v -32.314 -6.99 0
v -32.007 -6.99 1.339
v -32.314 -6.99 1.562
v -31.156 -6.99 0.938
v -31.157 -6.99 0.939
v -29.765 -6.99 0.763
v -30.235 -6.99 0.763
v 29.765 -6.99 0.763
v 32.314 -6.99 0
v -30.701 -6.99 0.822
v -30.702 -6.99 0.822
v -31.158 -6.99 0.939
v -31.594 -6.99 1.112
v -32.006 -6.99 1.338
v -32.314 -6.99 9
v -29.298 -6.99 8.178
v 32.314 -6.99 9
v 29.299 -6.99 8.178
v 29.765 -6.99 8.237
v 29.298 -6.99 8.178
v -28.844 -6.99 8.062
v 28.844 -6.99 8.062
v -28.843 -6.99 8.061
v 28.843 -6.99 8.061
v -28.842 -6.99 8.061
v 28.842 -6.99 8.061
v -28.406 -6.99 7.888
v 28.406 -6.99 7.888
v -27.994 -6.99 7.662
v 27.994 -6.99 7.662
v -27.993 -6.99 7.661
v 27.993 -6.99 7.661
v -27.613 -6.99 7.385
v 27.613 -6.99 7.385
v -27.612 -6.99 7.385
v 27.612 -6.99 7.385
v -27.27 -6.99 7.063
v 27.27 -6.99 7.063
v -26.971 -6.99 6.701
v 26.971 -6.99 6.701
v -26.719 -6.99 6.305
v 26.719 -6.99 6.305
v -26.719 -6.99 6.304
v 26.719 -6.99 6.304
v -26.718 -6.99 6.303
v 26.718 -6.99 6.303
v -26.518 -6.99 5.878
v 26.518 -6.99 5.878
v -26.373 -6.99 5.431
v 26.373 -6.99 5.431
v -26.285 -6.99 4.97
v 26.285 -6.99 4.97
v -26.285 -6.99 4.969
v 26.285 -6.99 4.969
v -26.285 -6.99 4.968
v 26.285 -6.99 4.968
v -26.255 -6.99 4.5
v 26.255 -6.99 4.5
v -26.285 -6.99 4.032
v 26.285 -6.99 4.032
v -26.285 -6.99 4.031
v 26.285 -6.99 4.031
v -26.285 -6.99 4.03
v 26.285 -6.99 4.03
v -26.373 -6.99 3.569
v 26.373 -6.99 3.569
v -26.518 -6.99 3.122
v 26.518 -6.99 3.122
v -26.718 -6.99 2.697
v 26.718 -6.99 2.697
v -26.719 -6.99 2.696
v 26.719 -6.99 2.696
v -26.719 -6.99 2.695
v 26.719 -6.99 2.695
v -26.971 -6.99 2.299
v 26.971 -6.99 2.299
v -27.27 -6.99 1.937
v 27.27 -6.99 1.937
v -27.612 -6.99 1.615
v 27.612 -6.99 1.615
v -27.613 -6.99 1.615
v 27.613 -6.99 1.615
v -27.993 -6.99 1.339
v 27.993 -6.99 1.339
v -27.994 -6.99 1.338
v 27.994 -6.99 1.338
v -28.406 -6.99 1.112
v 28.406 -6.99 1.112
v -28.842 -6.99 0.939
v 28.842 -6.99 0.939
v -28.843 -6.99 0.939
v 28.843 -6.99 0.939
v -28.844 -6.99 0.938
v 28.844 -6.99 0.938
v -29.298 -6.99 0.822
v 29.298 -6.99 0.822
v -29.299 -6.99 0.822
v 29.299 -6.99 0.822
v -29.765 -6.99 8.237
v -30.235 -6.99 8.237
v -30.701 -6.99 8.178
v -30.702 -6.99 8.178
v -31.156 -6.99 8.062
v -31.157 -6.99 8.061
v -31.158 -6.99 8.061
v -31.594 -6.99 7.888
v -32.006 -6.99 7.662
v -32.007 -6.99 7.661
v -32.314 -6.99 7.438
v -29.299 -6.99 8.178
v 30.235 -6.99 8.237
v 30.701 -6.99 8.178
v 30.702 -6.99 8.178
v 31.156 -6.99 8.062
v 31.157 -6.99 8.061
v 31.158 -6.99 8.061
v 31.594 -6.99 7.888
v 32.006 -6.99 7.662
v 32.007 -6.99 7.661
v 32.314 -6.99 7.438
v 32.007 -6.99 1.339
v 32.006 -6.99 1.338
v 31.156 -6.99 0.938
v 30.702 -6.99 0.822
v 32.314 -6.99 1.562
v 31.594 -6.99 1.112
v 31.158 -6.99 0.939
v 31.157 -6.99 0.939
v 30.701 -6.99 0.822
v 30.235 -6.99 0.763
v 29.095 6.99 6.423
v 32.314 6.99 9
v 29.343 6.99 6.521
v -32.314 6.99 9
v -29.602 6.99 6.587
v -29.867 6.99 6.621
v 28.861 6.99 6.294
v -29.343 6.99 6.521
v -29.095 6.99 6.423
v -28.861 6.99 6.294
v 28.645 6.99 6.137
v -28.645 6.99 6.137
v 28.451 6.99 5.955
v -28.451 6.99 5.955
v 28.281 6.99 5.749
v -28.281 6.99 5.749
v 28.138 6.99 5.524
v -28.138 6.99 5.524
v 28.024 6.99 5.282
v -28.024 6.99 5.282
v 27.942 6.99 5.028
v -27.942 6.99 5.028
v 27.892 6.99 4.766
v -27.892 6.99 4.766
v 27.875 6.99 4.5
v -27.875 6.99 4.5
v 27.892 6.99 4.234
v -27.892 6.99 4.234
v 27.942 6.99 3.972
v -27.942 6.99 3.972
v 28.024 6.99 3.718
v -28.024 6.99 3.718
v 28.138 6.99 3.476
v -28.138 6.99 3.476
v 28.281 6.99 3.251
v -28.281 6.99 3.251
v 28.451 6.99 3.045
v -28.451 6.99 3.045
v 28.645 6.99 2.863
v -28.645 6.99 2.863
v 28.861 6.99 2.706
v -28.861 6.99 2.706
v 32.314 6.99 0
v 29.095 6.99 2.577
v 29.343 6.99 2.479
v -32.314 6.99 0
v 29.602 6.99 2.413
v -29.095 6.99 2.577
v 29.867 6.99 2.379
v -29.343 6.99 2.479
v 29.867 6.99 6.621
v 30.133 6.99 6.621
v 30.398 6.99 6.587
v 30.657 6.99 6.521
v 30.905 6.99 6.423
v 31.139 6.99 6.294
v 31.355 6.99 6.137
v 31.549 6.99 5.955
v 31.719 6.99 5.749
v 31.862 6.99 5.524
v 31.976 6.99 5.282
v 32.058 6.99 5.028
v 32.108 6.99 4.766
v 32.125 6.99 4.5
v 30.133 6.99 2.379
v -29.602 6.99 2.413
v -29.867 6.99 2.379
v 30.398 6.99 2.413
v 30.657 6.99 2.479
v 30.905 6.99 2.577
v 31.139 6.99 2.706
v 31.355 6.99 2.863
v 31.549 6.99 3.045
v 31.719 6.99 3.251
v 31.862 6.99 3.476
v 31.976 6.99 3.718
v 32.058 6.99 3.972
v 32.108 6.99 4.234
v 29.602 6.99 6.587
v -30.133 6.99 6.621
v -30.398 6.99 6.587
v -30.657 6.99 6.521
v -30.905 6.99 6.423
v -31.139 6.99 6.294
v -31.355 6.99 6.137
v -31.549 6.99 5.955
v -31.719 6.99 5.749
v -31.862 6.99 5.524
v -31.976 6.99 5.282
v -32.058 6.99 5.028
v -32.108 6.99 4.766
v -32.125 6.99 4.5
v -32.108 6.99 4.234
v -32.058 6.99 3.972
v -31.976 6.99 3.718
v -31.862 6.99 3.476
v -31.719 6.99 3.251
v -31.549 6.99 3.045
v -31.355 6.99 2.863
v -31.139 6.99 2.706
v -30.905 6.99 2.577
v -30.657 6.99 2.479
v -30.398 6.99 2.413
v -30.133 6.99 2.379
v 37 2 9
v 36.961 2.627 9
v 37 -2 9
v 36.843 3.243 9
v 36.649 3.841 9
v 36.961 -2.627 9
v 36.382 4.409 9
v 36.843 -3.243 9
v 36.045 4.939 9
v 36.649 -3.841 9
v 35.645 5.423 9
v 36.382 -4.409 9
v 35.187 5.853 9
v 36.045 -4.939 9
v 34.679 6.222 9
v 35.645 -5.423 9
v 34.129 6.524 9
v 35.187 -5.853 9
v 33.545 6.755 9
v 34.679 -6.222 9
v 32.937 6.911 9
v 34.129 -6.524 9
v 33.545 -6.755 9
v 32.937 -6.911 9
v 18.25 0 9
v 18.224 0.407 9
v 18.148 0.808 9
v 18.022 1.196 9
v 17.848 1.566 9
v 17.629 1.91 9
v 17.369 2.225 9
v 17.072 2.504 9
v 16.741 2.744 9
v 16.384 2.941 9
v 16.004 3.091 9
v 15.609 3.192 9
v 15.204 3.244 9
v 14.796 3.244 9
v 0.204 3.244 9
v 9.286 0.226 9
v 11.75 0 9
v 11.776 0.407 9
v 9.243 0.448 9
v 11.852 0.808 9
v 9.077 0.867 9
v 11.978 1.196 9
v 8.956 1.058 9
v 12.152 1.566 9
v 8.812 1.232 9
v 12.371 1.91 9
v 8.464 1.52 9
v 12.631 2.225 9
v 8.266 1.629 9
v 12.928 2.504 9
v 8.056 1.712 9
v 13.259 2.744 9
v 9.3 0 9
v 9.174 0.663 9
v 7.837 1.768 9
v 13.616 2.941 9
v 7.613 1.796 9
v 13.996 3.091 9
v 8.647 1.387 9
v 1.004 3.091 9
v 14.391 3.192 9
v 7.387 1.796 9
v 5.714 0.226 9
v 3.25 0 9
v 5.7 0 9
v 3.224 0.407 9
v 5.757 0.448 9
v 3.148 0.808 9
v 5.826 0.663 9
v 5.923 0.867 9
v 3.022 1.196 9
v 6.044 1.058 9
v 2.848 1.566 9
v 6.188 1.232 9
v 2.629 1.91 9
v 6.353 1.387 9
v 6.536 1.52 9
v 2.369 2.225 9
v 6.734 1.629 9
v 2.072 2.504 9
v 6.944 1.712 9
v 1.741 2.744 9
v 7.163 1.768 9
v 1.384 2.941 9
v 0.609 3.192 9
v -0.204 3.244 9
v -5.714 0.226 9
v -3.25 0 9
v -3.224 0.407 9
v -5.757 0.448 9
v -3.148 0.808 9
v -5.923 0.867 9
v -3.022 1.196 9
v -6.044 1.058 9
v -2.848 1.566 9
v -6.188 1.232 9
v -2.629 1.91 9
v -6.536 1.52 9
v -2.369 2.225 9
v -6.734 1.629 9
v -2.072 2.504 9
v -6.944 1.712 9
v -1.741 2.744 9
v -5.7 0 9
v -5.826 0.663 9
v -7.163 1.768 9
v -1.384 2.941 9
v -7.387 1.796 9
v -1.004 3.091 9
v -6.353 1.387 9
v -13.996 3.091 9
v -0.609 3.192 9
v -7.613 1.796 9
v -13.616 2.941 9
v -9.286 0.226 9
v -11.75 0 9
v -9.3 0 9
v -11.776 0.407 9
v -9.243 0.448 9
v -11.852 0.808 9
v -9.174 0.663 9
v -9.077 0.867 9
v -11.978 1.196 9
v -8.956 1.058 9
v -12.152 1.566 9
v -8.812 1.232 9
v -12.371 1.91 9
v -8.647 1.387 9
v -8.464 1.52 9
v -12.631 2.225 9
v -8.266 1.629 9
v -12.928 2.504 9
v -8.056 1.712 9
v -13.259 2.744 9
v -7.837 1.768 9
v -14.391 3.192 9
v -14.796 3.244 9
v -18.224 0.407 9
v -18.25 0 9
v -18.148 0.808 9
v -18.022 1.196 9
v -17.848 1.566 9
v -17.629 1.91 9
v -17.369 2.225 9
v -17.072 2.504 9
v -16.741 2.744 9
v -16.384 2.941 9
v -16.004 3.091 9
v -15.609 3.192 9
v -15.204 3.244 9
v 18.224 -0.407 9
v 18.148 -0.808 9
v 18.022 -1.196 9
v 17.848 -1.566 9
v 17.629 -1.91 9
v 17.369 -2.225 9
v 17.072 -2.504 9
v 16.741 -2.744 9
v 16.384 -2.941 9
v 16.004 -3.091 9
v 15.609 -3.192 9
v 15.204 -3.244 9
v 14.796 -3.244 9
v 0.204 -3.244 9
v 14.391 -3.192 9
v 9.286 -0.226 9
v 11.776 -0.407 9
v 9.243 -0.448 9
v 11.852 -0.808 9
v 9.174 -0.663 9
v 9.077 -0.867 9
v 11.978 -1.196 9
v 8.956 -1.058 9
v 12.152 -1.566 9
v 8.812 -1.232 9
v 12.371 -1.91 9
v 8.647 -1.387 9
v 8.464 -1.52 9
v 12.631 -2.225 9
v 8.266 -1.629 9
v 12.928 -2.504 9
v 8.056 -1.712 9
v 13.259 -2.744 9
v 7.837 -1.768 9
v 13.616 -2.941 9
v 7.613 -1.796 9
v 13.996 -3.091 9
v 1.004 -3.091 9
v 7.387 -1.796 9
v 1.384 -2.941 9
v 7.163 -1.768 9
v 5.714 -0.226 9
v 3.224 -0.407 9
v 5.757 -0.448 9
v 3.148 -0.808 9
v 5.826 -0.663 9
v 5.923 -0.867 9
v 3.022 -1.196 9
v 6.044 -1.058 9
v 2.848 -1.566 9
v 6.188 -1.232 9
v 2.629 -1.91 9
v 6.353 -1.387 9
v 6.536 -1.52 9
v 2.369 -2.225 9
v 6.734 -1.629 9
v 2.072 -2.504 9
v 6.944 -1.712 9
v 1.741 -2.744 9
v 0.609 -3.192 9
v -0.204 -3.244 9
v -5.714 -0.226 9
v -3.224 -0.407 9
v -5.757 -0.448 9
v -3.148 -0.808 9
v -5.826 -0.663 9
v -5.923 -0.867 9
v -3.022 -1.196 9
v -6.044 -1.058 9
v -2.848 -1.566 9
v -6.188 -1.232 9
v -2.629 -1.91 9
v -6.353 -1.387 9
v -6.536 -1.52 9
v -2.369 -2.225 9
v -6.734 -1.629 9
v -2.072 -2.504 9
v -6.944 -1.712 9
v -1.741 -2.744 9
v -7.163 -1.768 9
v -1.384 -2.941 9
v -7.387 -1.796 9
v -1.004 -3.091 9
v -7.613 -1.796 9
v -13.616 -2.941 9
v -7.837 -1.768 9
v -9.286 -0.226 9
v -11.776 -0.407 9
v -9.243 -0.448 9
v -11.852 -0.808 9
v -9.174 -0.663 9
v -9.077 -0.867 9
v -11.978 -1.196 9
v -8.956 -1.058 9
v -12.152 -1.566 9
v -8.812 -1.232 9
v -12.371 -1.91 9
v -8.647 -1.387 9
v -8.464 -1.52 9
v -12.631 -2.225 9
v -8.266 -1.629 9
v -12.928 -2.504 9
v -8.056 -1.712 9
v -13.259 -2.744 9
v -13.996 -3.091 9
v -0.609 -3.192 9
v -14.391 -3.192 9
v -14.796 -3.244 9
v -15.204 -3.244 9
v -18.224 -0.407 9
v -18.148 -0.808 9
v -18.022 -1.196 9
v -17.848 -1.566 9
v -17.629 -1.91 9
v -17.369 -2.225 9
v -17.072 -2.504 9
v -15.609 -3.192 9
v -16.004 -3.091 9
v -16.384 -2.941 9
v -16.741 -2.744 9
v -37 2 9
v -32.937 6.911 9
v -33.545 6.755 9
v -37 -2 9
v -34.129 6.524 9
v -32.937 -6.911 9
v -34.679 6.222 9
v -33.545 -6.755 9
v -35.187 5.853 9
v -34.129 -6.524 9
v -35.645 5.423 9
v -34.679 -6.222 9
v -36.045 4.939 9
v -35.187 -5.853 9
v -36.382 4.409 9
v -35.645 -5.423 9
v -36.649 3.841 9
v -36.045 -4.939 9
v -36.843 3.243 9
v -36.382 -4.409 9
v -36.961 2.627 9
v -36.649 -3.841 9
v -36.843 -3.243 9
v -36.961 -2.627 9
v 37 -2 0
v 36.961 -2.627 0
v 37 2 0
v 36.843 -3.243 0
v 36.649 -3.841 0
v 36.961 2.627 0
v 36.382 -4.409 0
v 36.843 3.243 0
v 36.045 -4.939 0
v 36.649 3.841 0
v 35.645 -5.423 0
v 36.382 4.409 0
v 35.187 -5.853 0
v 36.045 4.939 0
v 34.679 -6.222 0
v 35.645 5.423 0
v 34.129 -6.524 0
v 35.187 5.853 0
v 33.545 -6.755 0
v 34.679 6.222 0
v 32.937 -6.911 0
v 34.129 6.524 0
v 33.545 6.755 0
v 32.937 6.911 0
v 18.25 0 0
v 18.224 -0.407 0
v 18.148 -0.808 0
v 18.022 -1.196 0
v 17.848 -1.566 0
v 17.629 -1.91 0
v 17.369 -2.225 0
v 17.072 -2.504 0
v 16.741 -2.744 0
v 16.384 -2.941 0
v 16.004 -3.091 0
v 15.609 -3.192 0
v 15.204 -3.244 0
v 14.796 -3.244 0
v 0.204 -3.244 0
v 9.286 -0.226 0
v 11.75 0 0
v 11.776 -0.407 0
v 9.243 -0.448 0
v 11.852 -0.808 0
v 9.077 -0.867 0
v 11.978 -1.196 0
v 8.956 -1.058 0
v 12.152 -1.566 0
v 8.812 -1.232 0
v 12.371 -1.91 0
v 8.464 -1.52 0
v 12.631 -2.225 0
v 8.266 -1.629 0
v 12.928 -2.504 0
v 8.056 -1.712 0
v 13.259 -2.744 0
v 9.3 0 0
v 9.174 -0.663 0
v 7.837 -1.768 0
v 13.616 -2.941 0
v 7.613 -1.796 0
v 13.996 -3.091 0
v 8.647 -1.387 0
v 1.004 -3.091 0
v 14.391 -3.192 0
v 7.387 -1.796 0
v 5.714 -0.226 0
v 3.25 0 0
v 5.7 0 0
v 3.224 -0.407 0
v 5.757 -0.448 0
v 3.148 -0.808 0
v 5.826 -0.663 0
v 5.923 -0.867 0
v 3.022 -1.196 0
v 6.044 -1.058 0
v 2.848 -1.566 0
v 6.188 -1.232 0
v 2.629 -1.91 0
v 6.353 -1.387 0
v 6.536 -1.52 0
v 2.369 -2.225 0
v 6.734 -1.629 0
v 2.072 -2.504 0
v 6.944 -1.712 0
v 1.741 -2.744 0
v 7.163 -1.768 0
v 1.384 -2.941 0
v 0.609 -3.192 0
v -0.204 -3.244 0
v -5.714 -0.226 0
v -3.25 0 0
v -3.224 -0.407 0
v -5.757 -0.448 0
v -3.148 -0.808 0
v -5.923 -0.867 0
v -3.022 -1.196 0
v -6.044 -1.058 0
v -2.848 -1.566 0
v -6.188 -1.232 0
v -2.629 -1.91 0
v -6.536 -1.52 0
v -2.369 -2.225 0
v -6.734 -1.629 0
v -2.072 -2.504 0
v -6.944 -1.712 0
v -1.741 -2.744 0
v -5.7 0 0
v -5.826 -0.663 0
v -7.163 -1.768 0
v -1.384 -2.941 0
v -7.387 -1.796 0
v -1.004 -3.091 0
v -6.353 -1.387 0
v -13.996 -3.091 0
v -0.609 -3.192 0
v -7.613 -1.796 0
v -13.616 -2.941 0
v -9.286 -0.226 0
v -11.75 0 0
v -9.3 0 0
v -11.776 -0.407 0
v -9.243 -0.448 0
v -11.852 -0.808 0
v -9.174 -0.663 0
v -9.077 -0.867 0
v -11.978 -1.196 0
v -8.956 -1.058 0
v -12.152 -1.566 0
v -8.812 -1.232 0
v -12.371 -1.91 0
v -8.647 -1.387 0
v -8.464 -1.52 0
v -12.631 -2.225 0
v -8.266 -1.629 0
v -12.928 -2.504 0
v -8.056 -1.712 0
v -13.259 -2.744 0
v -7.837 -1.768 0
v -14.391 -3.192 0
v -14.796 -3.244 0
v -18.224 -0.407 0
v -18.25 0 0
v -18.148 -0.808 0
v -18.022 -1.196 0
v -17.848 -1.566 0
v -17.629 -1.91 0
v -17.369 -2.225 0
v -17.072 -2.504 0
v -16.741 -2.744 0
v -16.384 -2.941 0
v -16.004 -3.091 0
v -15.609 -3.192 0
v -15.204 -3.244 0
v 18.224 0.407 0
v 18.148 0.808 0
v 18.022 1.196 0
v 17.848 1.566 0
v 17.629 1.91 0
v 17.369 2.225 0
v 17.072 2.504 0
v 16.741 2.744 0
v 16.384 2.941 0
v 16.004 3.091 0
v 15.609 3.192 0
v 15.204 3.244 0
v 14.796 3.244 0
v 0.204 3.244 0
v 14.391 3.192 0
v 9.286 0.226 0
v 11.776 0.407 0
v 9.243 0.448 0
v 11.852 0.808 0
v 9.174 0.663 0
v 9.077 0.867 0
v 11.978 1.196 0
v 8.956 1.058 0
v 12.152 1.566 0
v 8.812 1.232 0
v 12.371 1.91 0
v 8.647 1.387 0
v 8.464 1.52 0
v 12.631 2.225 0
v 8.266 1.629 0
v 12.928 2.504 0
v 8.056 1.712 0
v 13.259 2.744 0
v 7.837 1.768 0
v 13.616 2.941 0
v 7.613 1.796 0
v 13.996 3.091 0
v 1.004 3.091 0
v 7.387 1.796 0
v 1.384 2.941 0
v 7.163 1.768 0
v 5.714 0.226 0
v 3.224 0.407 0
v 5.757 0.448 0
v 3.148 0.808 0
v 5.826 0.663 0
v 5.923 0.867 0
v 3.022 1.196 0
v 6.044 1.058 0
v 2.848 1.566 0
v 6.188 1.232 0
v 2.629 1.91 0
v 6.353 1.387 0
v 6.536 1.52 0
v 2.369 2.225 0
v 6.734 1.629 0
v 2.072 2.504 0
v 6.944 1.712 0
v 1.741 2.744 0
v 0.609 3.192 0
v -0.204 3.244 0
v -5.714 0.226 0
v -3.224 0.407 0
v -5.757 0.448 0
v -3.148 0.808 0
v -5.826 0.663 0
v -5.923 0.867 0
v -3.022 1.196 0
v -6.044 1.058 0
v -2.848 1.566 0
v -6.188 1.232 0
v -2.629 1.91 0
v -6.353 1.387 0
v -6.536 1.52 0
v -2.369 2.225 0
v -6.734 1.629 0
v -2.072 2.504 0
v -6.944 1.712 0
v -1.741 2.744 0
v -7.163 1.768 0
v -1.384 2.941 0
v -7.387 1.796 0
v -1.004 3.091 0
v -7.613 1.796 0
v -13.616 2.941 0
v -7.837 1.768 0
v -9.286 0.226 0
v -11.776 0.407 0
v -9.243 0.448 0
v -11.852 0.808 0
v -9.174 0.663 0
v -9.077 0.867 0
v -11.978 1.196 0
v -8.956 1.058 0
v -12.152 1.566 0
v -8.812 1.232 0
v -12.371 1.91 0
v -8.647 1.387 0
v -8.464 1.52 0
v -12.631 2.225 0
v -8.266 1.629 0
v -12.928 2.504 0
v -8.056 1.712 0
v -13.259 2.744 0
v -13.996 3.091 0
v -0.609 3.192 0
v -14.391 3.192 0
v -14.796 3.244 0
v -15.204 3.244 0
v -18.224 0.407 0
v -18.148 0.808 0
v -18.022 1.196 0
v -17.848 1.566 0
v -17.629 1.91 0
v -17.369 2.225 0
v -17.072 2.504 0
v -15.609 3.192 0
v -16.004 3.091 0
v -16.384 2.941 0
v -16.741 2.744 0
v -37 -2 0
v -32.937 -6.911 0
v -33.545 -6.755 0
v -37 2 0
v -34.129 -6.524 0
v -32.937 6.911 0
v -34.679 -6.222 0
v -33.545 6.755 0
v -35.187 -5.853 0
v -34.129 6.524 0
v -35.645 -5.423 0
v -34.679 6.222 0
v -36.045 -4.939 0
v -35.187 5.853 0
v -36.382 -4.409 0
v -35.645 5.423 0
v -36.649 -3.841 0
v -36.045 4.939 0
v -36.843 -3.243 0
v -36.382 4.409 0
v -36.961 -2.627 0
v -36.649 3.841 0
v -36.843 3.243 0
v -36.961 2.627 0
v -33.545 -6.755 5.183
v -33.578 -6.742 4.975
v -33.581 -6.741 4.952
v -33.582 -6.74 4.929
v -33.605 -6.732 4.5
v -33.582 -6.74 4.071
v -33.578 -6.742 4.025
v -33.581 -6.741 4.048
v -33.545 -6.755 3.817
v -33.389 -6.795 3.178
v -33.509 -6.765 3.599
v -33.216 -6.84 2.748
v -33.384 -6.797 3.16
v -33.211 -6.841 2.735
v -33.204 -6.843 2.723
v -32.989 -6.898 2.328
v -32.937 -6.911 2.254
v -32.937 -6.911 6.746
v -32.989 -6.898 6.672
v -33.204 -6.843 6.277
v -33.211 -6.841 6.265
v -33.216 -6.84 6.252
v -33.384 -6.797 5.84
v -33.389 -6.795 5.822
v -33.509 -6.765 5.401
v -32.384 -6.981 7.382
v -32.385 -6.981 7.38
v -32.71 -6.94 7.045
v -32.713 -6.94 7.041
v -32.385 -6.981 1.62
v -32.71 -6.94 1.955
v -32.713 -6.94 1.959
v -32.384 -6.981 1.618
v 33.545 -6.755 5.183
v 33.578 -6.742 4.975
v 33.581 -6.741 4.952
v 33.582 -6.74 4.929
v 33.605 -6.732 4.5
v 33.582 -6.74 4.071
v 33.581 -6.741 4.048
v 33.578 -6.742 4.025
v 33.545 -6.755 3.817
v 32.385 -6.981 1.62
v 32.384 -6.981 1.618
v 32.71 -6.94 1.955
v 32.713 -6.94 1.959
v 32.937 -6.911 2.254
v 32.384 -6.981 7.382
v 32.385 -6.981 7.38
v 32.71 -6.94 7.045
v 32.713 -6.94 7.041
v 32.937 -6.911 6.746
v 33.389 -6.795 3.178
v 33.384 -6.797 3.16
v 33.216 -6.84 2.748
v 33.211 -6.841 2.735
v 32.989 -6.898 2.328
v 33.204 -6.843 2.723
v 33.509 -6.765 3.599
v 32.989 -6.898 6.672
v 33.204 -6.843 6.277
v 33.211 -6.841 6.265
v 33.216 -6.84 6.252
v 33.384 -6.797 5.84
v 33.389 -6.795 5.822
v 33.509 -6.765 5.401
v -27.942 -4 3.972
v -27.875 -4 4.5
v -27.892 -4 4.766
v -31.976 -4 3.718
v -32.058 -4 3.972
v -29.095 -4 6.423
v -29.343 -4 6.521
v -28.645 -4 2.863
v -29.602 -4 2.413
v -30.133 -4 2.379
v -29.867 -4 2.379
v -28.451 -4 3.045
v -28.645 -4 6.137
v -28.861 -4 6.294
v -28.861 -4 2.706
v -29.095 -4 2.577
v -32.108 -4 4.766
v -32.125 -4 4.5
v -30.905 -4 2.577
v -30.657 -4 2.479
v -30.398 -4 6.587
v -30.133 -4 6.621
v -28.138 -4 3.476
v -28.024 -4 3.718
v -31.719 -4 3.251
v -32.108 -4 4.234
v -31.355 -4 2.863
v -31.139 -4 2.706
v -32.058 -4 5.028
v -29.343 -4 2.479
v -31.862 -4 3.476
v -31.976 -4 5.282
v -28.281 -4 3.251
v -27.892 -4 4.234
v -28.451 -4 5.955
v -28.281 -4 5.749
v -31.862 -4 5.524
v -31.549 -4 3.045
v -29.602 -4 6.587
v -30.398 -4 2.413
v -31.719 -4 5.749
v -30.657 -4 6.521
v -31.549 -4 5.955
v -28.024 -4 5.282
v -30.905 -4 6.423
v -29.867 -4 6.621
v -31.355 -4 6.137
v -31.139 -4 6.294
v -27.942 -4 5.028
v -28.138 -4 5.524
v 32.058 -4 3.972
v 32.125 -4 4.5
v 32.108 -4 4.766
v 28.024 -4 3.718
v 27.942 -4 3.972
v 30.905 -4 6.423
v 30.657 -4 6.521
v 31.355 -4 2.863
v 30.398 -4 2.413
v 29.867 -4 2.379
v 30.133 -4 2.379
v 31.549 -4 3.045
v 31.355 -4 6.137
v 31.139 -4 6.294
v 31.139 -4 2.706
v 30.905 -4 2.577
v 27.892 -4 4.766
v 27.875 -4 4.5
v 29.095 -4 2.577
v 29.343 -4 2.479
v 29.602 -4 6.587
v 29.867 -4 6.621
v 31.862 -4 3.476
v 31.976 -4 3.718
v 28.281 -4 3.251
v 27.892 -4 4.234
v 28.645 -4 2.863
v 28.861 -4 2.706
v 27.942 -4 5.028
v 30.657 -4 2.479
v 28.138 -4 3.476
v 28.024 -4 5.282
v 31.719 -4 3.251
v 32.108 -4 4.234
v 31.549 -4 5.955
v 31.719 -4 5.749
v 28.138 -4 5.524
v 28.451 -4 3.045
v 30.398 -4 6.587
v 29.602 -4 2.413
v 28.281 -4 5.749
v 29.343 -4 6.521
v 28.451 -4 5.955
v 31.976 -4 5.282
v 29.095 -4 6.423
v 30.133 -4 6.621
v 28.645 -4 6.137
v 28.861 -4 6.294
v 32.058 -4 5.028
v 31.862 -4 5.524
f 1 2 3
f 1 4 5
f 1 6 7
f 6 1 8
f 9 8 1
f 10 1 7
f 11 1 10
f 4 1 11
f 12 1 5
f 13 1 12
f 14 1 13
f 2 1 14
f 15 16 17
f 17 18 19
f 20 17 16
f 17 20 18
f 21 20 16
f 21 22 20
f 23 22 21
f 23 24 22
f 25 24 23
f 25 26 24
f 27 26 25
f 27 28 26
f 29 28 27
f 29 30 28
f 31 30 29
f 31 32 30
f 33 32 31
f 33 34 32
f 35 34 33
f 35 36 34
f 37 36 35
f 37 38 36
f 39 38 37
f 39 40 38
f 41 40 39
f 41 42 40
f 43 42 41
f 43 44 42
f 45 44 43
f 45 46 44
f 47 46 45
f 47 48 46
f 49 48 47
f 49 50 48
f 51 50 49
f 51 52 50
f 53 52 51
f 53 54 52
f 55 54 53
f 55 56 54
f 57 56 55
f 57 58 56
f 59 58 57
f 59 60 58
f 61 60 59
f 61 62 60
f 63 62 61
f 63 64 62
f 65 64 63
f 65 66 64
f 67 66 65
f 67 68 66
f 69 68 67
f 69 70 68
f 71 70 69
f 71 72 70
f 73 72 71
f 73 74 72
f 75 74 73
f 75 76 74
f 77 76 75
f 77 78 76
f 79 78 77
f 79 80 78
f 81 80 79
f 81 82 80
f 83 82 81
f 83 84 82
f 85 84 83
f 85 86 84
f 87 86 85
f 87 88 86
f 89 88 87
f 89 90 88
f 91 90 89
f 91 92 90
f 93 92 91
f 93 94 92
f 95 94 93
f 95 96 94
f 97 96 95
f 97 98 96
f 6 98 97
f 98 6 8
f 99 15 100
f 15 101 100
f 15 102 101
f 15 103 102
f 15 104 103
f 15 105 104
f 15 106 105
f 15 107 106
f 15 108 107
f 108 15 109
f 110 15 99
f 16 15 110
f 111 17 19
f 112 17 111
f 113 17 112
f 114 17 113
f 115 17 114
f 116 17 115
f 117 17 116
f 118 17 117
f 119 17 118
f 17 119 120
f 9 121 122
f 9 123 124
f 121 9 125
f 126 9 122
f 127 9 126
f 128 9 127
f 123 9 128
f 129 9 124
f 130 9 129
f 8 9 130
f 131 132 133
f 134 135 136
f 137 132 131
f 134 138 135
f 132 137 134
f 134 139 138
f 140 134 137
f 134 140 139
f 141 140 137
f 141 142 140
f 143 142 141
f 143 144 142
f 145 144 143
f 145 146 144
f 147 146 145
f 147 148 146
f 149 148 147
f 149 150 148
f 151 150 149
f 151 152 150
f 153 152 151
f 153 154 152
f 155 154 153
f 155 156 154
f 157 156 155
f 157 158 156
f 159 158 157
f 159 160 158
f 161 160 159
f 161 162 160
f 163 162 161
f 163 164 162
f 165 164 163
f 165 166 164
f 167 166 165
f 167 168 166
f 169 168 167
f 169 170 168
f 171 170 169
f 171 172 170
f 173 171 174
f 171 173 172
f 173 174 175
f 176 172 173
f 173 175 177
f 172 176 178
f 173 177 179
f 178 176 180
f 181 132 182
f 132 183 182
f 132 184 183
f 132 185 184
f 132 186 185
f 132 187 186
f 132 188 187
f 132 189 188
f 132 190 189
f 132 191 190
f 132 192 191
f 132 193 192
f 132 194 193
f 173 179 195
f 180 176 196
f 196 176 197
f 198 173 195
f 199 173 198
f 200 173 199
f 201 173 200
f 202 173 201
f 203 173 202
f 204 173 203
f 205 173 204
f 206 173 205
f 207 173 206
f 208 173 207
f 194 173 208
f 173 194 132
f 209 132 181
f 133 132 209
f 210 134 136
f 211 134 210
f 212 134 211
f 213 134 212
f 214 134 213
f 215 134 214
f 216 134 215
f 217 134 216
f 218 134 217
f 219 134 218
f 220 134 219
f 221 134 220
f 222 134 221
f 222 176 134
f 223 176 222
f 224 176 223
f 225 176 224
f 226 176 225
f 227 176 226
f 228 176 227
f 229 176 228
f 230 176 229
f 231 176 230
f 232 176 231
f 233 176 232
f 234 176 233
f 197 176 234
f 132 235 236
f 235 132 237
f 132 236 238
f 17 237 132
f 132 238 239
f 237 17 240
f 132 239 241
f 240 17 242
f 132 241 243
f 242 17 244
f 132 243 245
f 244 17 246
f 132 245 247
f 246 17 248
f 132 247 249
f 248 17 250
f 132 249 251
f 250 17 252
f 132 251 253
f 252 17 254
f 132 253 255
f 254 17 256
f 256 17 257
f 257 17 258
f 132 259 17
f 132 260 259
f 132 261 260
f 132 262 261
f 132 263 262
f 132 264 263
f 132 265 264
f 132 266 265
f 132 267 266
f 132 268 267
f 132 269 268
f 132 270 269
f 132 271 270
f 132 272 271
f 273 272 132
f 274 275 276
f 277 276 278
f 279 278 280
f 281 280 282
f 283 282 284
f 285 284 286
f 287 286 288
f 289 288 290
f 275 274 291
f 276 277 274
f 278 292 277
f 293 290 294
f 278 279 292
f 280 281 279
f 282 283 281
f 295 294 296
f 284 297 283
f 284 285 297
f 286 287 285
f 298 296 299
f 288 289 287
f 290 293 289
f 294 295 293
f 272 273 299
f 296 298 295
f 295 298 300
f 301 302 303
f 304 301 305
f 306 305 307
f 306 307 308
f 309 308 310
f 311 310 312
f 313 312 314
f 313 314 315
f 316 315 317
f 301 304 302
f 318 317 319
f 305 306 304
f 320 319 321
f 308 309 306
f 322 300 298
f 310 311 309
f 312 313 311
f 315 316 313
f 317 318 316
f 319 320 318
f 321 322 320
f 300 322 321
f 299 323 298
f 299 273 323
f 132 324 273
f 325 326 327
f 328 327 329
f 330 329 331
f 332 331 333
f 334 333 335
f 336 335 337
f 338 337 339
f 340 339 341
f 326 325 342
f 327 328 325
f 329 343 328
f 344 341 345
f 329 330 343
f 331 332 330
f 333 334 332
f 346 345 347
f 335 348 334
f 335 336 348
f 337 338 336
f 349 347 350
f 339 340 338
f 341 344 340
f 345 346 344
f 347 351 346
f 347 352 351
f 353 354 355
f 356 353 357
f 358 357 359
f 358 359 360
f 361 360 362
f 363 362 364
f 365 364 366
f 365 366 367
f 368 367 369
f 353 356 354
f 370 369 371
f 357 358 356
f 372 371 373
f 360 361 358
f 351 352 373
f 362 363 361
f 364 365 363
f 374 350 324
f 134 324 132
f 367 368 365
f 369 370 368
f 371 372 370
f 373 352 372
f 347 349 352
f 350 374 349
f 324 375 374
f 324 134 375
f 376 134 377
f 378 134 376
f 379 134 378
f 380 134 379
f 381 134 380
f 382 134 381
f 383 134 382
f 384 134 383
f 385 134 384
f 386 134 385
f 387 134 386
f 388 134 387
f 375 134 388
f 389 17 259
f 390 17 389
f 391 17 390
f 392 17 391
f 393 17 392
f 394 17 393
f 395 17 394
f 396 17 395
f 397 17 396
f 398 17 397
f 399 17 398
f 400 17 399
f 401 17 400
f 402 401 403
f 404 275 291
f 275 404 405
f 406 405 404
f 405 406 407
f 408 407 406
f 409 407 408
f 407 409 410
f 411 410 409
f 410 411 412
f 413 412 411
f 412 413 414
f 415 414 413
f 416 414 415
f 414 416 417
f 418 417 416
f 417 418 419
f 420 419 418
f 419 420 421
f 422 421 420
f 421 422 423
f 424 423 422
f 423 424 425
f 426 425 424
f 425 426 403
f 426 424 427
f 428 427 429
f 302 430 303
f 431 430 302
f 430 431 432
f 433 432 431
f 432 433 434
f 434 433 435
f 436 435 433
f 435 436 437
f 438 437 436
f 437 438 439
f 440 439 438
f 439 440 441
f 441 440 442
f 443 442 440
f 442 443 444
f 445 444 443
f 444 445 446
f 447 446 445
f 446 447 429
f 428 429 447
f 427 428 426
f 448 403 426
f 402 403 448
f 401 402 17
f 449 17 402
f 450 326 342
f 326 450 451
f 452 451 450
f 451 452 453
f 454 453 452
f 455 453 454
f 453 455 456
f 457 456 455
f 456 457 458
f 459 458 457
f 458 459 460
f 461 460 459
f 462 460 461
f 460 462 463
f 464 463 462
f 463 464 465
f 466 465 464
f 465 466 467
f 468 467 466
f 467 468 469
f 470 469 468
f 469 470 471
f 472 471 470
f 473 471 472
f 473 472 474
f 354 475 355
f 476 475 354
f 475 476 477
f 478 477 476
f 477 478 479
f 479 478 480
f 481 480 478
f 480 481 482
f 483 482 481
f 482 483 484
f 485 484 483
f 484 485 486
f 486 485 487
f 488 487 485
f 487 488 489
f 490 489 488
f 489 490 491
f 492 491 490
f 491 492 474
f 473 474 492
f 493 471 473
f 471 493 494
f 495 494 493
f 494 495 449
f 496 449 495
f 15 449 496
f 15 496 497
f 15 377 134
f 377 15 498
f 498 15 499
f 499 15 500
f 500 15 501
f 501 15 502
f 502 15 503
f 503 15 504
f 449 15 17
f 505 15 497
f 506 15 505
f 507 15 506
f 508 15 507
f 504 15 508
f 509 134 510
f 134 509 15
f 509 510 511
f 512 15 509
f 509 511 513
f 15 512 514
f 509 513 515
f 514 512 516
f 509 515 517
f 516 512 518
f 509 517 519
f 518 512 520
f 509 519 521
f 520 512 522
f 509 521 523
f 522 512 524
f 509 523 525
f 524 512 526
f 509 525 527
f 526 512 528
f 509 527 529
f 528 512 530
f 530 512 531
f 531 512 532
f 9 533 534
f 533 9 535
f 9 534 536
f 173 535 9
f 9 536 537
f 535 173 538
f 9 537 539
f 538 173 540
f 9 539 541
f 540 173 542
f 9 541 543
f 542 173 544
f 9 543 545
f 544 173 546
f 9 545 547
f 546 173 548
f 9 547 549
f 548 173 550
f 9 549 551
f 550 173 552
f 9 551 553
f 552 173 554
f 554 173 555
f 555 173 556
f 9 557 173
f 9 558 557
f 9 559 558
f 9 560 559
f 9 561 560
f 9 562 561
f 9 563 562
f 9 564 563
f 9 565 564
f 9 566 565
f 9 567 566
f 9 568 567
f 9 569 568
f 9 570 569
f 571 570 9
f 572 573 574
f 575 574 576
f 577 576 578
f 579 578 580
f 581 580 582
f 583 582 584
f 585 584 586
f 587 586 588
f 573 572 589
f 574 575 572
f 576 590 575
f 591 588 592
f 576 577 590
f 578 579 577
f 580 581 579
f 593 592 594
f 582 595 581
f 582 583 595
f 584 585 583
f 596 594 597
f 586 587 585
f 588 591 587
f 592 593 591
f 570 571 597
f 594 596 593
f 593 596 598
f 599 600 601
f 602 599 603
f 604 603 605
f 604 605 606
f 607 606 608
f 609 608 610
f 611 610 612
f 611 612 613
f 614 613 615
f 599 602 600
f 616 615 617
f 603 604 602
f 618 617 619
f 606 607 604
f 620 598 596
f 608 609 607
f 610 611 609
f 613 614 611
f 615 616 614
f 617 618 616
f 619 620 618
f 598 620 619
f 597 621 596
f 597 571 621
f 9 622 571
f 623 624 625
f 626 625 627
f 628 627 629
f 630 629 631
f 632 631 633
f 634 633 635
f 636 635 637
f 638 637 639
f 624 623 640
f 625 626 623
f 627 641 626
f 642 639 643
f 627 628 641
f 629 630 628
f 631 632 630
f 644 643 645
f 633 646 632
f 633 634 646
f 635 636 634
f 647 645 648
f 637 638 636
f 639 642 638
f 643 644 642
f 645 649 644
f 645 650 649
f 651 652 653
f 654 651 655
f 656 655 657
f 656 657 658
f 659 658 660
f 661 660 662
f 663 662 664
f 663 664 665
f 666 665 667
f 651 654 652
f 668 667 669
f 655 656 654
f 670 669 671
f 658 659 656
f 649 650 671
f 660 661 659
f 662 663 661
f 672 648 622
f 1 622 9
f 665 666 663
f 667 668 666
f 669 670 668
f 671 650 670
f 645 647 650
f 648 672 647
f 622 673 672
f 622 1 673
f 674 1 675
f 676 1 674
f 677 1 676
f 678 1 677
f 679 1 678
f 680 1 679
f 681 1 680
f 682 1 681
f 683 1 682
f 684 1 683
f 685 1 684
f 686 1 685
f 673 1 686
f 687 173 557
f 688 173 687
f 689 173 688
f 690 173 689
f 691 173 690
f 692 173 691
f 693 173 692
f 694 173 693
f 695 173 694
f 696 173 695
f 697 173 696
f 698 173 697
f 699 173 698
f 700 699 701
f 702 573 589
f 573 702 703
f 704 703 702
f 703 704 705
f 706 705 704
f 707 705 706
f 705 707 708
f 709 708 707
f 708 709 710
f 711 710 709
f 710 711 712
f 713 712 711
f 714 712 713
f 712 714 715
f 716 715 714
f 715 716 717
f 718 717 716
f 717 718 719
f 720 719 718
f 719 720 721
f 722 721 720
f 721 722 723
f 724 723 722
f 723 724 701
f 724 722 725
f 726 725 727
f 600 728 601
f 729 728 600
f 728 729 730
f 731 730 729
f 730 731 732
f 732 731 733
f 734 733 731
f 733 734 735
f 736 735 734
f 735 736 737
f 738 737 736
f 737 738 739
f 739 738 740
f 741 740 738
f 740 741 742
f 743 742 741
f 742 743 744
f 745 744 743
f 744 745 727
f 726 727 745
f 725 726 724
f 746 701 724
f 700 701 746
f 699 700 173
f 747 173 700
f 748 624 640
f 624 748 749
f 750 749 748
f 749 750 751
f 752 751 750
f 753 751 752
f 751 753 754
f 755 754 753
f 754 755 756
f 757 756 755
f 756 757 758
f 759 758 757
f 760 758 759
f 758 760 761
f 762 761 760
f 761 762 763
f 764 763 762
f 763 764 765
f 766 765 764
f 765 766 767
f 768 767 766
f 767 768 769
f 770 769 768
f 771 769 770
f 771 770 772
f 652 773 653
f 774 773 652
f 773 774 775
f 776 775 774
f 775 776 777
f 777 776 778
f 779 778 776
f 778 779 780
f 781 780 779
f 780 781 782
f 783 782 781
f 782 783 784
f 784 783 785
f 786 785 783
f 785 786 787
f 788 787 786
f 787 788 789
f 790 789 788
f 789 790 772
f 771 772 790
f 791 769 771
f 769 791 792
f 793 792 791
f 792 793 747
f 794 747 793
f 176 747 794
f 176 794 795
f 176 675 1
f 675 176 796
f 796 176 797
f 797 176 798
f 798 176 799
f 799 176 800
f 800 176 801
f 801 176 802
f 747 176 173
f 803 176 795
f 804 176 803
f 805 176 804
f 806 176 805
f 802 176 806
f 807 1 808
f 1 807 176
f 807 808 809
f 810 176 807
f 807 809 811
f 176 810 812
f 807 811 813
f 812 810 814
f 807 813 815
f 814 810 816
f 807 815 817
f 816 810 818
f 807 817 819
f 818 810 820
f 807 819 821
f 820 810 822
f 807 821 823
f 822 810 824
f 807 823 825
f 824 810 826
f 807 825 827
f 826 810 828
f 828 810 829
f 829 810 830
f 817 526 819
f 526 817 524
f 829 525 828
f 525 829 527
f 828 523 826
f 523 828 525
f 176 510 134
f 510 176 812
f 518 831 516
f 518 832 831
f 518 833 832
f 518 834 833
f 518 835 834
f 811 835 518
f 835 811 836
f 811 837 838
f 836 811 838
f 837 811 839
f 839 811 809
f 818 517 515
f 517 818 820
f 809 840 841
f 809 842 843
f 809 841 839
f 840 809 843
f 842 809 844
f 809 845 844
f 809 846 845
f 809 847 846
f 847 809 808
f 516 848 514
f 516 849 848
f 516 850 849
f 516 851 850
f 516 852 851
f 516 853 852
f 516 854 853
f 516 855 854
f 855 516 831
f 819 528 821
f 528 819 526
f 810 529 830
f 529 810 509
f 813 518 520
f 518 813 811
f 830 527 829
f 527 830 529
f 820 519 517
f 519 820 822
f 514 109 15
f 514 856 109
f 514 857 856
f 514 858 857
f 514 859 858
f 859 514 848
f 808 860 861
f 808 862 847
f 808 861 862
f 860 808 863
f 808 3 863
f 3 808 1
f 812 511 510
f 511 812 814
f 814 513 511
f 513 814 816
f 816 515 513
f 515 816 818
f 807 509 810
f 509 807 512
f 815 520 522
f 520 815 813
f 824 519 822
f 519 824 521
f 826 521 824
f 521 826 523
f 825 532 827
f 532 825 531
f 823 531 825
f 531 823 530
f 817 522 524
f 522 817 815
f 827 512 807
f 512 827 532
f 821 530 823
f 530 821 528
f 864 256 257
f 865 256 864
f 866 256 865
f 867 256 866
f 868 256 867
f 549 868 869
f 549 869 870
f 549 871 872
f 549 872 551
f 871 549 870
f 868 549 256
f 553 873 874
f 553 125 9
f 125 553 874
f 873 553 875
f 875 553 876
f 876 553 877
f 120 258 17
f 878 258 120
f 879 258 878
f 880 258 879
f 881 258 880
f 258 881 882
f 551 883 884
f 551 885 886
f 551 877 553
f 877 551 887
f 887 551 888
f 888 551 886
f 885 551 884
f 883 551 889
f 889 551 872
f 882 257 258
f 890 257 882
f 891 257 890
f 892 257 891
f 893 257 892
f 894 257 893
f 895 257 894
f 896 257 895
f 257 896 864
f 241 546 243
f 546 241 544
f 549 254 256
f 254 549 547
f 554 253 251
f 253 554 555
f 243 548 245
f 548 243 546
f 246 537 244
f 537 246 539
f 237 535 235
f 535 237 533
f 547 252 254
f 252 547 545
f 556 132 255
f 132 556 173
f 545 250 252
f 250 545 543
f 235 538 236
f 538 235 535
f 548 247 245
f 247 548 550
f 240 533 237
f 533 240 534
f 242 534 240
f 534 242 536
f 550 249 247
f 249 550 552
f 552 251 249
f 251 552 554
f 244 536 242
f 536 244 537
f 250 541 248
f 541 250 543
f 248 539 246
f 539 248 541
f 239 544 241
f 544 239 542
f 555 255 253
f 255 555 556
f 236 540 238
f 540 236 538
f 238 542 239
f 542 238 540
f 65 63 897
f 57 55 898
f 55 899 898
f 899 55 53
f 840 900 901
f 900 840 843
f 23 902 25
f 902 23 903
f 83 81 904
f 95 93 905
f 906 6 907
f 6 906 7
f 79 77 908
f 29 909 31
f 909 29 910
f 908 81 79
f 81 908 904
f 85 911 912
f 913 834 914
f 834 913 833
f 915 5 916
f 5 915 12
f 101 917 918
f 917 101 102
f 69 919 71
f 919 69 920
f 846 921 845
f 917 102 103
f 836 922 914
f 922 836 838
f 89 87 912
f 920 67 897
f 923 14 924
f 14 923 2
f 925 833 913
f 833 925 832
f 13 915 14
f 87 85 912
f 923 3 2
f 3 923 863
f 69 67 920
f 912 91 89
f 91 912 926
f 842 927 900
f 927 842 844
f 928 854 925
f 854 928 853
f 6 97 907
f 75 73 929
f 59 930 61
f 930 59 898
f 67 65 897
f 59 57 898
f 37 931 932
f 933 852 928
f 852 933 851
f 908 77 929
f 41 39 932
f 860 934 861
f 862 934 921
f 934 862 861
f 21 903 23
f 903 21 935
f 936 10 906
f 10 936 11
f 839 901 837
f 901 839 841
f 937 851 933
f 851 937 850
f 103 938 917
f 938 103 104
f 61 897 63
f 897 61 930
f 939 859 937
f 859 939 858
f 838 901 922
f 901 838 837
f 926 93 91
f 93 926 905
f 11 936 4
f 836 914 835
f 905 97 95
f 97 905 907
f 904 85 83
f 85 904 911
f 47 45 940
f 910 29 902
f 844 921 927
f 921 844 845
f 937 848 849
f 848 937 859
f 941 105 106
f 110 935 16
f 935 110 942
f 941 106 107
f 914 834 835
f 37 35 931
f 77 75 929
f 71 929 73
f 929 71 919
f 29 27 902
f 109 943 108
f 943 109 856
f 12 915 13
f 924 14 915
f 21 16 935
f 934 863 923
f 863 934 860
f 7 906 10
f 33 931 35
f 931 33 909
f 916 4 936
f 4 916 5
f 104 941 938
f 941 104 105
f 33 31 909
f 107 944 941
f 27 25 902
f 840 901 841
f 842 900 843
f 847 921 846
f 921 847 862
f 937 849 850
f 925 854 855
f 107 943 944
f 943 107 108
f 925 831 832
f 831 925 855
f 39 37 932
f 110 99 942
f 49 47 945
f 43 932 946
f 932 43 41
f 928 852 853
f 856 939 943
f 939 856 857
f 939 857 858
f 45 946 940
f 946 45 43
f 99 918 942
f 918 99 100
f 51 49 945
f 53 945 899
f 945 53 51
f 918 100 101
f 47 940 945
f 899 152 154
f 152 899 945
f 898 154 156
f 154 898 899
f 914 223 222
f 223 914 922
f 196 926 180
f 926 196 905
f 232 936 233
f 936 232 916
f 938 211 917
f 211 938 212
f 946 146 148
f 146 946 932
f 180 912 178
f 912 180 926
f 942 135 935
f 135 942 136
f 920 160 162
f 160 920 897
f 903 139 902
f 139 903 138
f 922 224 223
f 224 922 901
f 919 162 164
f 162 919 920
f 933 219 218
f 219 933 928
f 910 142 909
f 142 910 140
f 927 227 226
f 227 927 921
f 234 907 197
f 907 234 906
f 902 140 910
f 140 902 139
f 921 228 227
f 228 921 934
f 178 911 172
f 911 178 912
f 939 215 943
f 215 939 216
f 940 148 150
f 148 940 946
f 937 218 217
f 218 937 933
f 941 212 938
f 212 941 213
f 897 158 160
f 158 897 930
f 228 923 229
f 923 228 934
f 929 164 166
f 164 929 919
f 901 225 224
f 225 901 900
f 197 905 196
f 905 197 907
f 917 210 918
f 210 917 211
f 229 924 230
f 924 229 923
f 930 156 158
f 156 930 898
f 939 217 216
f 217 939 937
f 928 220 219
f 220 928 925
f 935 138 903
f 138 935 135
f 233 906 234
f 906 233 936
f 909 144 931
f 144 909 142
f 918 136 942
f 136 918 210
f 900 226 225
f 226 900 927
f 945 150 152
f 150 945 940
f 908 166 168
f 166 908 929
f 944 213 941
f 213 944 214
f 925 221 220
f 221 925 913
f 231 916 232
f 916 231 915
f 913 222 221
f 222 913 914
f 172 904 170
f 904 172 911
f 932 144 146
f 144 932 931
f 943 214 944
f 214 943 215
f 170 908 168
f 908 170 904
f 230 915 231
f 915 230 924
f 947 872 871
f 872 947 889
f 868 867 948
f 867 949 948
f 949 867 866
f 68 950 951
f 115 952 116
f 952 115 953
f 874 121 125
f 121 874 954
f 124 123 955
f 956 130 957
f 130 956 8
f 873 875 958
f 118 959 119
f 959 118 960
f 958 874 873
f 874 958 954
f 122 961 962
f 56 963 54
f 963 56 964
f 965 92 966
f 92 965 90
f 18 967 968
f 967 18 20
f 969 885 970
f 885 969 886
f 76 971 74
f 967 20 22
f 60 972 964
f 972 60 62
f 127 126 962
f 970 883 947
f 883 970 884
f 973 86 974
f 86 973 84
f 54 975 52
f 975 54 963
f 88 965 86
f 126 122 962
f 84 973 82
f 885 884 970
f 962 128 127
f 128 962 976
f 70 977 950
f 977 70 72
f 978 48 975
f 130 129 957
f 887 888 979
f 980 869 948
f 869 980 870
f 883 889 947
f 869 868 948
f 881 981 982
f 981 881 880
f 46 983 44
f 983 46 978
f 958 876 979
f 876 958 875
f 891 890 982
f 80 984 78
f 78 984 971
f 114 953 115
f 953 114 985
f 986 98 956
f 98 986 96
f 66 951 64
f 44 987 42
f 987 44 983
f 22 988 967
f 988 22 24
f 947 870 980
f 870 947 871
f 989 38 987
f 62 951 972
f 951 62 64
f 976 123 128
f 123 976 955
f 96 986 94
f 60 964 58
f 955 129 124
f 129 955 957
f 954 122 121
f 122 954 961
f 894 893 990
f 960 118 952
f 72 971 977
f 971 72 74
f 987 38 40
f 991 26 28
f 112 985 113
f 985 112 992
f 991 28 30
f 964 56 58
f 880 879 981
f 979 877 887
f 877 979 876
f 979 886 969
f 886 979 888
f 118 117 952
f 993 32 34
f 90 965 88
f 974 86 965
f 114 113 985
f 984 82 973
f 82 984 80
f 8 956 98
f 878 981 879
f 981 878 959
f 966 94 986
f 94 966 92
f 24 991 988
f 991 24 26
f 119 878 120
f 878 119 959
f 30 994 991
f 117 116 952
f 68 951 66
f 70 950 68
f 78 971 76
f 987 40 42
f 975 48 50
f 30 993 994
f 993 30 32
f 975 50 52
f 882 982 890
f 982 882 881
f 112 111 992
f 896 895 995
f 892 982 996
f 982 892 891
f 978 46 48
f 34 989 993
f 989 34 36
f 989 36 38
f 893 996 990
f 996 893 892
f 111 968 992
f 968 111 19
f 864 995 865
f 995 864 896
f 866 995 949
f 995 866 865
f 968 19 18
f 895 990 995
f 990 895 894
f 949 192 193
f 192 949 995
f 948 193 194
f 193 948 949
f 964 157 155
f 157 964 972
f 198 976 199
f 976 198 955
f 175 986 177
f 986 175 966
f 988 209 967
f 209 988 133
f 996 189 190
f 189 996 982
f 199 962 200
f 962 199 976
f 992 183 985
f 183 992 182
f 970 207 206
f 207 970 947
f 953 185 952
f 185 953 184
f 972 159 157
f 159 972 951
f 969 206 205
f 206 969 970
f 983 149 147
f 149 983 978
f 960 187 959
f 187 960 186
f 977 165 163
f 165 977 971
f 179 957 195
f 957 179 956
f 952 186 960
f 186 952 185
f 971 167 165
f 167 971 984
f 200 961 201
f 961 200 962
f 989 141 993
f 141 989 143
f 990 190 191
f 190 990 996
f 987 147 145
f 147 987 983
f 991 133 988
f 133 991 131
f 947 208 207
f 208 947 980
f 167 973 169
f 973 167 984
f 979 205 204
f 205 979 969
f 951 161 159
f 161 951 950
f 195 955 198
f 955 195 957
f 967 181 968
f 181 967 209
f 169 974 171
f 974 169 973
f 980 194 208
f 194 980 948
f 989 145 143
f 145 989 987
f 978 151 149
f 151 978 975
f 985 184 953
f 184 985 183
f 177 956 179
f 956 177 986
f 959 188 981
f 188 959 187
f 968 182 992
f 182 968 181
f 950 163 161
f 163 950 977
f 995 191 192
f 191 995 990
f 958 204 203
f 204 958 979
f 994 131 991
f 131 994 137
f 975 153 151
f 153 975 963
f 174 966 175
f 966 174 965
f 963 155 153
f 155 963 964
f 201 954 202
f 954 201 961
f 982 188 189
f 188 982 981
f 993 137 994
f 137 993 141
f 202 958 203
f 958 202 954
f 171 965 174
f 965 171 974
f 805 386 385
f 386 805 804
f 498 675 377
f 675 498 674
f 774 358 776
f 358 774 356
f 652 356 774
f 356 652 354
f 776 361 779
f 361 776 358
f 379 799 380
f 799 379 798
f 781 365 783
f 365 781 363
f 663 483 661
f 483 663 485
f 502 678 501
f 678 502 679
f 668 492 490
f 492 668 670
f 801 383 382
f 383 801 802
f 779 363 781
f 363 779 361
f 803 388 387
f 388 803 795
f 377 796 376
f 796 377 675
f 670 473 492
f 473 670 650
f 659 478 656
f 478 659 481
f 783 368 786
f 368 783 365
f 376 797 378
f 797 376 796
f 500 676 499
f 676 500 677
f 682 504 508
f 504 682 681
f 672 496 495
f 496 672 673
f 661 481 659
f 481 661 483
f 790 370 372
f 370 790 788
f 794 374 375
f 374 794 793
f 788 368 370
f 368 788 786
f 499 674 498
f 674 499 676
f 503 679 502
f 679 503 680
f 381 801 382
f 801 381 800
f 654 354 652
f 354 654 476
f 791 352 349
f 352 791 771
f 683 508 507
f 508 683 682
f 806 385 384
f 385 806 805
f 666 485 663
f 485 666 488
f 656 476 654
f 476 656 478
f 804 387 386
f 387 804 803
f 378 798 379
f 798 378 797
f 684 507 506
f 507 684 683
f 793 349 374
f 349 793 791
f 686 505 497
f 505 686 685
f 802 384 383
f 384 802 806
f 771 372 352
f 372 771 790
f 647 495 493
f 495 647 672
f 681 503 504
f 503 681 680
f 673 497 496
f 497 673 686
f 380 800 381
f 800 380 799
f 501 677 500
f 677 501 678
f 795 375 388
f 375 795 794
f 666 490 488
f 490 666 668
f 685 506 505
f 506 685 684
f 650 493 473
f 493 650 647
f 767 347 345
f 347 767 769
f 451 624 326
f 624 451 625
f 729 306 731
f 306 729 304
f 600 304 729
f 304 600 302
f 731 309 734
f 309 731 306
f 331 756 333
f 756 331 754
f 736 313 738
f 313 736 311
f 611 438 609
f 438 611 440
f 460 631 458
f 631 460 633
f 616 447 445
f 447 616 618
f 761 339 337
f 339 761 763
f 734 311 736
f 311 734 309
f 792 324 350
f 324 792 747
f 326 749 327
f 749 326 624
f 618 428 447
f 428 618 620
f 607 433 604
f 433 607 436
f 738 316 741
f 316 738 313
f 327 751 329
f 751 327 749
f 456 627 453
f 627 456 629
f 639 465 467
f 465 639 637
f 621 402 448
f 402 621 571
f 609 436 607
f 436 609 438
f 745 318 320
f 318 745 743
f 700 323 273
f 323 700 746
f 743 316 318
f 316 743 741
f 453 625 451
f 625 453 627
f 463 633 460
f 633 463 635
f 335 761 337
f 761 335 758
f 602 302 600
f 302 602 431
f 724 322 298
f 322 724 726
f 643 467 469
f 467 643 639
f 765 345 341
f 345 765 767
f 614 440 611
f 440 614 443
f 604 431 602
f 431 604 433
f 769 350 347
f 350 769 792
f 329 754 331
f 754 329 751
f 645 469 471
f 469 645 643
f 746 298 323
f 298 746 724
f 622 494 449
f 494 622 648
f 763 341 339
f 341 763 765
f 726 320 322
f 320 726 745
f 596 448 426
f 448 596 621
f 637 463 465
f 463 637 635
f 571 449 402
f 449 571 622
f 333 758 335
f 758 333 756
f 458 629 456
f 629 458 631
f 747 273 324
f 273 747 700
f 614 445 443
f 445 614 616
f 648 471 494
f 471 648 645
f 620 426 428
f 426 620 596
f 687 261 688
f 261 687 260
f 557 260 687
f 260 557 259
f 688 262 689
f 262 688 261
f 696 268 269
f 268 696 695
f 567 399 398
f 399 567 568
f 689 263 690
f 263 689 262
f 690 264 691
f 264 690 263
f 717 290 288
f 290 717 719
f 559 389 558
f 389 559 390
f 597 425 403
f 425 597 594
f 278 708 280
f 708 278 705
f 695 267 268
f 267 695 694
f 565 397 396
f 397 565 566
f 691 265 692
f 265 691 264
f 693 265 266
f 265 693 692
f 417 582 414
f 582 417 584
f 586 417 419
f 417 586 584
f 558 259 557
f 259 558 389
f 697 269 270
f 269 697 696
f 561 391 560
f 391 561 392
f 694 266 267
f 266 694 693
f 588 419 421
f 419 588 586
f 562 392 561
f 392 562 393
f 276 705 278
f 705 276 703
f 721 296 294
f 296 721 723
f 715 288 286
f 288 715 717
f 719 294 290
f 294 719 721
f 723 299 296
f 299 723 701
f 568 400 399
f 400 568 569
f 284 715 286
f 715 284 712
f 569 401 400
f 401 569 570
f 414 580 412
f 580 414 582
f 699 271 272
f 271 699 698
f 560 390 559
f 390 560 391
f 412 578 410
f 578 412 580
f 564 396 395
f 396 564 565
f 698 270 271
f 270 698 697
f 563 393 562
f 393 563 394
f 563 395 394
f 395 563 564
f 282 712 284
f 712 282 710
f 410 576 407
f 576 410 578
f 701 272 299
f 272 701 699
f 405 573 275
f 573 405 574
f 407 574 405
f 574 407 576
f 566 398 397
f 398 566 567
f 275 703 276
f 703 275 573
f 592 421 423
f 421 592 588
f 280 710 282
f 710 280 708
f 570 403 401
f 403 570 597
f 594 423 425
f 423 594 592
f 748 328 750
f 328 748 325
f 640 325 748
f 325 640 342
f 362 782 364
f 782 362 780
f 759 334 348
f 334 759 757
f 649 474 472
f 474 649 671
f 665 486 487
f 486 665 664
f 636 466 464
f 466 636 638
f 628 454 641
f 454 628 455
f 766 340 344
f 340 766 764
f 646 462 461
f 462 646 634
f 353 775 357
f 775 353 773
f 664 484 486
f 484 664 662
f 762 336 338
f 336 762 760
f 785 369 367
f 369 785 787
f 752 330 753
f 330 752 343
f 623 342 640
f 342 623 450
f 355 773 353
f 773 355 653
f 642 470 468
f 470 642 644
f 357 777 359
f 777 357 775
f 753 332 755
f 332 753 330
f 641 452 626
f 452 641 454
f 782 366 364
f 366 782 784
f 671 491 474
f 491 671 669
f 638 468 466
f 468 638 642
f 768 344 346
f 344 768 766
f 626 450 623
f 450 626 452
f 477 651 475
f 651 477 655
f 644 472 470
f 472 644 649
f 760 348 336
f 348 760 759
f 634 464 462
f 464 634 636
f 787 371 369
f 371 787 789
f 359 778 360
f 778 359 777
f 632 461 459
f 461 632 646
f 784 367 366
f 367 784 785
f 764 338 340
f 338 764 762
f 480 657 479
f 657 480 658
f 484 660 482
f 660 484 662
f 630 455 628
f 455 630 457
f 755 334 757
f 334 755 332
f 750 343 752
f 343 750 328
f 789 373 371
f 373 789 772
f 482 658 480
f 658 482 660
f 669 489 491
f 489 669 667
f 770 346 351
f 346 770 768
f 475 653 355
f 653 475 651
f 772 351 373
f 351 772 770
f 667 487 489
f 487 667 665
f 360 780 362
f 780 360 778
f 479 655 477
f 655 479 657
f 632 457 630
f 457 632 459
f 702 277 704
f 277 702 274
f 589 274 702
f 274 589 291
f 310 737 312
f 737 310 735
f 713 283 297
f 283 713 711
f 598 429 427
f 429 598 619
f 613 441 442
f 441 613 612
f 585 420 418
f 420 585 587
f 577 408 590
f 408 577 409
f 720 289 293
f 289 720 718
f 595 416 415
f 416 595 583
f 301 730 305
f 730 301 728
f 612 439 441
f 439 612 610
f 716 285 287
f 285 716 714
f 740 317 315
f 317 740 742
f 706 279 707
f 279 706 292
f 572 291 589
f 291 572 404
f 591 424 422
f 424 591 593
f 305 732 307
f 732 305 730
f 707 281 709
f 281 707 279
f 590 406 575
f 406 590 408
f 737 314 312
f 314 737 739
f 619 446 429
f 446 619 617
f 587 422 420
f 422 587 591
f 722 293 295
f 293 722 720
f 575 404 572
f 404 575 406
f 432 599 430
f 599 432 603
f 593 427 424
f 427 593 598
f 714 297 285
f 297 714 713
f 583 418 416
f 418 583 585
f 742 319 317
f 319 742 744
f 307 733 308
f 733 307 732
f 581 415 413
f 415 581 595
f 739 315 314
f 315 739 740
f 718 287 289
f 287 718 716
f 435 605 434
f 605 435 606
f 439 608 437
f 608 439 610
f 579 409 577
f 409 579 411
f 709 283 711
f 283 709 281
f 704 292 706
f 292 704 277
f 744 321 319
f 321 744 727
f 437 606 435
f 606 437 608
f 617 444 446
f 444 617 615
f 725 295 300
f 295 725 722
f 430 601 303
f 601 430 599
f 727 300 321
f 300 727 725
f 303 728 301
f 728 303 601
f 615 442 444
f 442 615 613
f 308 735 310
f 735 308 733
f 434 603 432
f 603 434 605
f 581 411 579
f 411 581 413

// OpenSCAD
$fn = 50;


difference() {
	union() {
		hull() {
			translate(v = [-17.0000000000, 2.0000000000, 0]) {
				cylinder(h = 9, r = 5);
			}
			translate(v = [17.0000000000, 2.0000000000, 0]) {
				cylinder(h = 9, r = 5);
			}
			translate(v = [-17.0000000000, -2.0000000000, 0]) {
				cylinder(h = 9, r = 5);
			}
			translate(v = [17.0000000000, -2.0000000000, 0]) {
				cylinder(h = 9, r = 5);
			}
		}
		translate(v = [-22.5000000000, 0.0000000000, 0]) {
			hull() {
				translate(v = [-9.5000000000, 2.0000000000, 0]) {
					cylinder(h = 9, r = 5);
				}
				translate(v = [9.5000000000, 2.0000000000, 0]) {
					cylinder(h = 9, r = 5);
				}
				translate(v = [-9.5000000000, -2.0000000000, 0]) {
					cylinder(h = 9, r = 5);
				}
				translate(v = [9.5000000000, -2.0000000000, 0]) {
					cylinder(h = 9, r = 5);
				}
			}
		}
		translate(v = [-22.5000000000, 0.0000000000, 0]) {
			hull() {
				translate(v = [-9.5000000000, 2.0000000000, 0]) {
					cylinder(h = 9, r = 5);
				}
				translate(v = [9.5000000000, 2.0000000000, 0]) {
					cylinder(h = 9, r = 5);
				}
				translate(v = [-9.5000000000, -2.0000000000, 0]) {
					cylinder(h = 9, r = 5);
				}
				translate(v = [9.5000000000, -2.0000000000, 0]) {
					cylinder(h = 9, r = 5);
				}
			}
		}
		translate(v = [22.5000000000, 0.0000000000, 0]) {
			hull() {
				translate(v = [-9.5000000000, 2.0000000000, 0]) {
					cylinder(h = 9, r = 5);
				}
				translate(v = [9.5000000000, 2.0000000000, 0]) {
					cylinder(h = 9, r = 5);
				}
				translate(v = [-9.5000000000, -2.0000000000, 0]) {
					cylinder(h = 9, r = 5);
				}
				translate(v = [9.5000000000, -2.0000000000, 0]) {
					cylinder(h = 9, r = 5);
				}
			}
		}
		translate(v = [22.5000000000, 0.0000000000, 0]) {
			hull() {
				translate(v = [-9.5000000000, 2.0000000000, 0]) {
					cylinder(h = 9, r = 5);
				}
				translate(v = [9.5000000000, 2.0000000000, 0]) {
					cylinder(h = 9, r = 5);
				}
				translate(v = [-9.5000000000, -2.0000000000, 0]) {
					cylinder(h = 9, r = 5);
				}
				translate(v = [9.5000000000, -2.0000000000, 0]) {
					cylinder(h = 9, r = 5);
				}
			}
		}
	}
	union() {
		translate(v = [-30.0000000000, -7.0000000000, 4.5000000000]) {
			rotate(a = [90, 0, 0]) {
				difference() {
					union() {
						#translate(v = [0, 0, -14.0000000000]) {
							cylinder(h = 14, r = 2.0000000000);
						}
						#translate(v = [0, 0, -3]) {
							cylinder(h = 3, r1 = 2.1250000000, r2 = 3.7500000000);
						}
						#translate(v = [0, 0, -14.0000000000]) {
							cylinder(h = 14, r = 2.1250000000);
						}
						#translate(v = [0, 0, -14.0000000000]) {
							cylinder(h = 14, r = 2.0000000000);
						}
					}
					union();
				}
			}
		}
		translate(v = [30.0000000000, -7.0000000000, 4.5000000000]) {
			rotate(a = [90, 0, 0]) {
				difference() {
					union() {
						#translate(v = [0, 0, -14.0000000000]) {
							cylinder(h = 14, r = 2.0000000000);
						}
						#translate(v = [0, 0, -3]) {
							cylinder(h = 3, r1 = 2.1250000000, r2 = 3.7500000000);
						}
						#translate(v = [0, 0, -14.0000000000]) {
							cylinder(h = 14, r = 2.1250000000);
						}
						#translate(v = [0, 0, -14.0000000000]) {
							cylinder(h = 14, r = 2.0000000000);
						}
					}
					union();
				}
			}
		}
		translate(v = [-15.0000000000, 0.0000000000, 0]) {
			translate(v = [0, 0, -100]) {
				cylinder(h = 200, r = 3.2500000000);
			}
		}
		translate(v = [0, 0, -100]) {
			cylinder(h = 200, r = 3.2500000000);
		}
		translate(v = [15.0000000000, 0.0000000000, 0]) {
			translate(v = [0, 0, -100]) {
				cylinder(h = 200, r = 3.2500000000);
			}
		}
		translate(v = [-15.0000000000, 0.0000000000, 0]) {
			translate(v = [0, 0, -100]) {
				cylinder(h = 200, r = 1.8000000000);
			}
		}
		translate(v = [-7.5000000000, 0.0000000000, 0]) {
			translate(v = [0, 0, -100]) {
				cylinder(h = 200, r = 1.8000000000);
			}
		}
		translate(v = [0, 0, -100]) {
			cylinder(h = 200, r = 1.8000000000);
		}
		translate(v = [7.5000000000, 0.0000000000, 0]) {
			translate(v = [0, 0, -100]) {
				cylinder(h = 200, r = 1.8000000000);
			}
		}
		translate(v = [15.0000000000, 0.0000000000, 0]) {
			translate(v = [0, 0, -100]) {
				cylinder(h = 200, r = 1.8000000000);
			}
		}
	}
}
